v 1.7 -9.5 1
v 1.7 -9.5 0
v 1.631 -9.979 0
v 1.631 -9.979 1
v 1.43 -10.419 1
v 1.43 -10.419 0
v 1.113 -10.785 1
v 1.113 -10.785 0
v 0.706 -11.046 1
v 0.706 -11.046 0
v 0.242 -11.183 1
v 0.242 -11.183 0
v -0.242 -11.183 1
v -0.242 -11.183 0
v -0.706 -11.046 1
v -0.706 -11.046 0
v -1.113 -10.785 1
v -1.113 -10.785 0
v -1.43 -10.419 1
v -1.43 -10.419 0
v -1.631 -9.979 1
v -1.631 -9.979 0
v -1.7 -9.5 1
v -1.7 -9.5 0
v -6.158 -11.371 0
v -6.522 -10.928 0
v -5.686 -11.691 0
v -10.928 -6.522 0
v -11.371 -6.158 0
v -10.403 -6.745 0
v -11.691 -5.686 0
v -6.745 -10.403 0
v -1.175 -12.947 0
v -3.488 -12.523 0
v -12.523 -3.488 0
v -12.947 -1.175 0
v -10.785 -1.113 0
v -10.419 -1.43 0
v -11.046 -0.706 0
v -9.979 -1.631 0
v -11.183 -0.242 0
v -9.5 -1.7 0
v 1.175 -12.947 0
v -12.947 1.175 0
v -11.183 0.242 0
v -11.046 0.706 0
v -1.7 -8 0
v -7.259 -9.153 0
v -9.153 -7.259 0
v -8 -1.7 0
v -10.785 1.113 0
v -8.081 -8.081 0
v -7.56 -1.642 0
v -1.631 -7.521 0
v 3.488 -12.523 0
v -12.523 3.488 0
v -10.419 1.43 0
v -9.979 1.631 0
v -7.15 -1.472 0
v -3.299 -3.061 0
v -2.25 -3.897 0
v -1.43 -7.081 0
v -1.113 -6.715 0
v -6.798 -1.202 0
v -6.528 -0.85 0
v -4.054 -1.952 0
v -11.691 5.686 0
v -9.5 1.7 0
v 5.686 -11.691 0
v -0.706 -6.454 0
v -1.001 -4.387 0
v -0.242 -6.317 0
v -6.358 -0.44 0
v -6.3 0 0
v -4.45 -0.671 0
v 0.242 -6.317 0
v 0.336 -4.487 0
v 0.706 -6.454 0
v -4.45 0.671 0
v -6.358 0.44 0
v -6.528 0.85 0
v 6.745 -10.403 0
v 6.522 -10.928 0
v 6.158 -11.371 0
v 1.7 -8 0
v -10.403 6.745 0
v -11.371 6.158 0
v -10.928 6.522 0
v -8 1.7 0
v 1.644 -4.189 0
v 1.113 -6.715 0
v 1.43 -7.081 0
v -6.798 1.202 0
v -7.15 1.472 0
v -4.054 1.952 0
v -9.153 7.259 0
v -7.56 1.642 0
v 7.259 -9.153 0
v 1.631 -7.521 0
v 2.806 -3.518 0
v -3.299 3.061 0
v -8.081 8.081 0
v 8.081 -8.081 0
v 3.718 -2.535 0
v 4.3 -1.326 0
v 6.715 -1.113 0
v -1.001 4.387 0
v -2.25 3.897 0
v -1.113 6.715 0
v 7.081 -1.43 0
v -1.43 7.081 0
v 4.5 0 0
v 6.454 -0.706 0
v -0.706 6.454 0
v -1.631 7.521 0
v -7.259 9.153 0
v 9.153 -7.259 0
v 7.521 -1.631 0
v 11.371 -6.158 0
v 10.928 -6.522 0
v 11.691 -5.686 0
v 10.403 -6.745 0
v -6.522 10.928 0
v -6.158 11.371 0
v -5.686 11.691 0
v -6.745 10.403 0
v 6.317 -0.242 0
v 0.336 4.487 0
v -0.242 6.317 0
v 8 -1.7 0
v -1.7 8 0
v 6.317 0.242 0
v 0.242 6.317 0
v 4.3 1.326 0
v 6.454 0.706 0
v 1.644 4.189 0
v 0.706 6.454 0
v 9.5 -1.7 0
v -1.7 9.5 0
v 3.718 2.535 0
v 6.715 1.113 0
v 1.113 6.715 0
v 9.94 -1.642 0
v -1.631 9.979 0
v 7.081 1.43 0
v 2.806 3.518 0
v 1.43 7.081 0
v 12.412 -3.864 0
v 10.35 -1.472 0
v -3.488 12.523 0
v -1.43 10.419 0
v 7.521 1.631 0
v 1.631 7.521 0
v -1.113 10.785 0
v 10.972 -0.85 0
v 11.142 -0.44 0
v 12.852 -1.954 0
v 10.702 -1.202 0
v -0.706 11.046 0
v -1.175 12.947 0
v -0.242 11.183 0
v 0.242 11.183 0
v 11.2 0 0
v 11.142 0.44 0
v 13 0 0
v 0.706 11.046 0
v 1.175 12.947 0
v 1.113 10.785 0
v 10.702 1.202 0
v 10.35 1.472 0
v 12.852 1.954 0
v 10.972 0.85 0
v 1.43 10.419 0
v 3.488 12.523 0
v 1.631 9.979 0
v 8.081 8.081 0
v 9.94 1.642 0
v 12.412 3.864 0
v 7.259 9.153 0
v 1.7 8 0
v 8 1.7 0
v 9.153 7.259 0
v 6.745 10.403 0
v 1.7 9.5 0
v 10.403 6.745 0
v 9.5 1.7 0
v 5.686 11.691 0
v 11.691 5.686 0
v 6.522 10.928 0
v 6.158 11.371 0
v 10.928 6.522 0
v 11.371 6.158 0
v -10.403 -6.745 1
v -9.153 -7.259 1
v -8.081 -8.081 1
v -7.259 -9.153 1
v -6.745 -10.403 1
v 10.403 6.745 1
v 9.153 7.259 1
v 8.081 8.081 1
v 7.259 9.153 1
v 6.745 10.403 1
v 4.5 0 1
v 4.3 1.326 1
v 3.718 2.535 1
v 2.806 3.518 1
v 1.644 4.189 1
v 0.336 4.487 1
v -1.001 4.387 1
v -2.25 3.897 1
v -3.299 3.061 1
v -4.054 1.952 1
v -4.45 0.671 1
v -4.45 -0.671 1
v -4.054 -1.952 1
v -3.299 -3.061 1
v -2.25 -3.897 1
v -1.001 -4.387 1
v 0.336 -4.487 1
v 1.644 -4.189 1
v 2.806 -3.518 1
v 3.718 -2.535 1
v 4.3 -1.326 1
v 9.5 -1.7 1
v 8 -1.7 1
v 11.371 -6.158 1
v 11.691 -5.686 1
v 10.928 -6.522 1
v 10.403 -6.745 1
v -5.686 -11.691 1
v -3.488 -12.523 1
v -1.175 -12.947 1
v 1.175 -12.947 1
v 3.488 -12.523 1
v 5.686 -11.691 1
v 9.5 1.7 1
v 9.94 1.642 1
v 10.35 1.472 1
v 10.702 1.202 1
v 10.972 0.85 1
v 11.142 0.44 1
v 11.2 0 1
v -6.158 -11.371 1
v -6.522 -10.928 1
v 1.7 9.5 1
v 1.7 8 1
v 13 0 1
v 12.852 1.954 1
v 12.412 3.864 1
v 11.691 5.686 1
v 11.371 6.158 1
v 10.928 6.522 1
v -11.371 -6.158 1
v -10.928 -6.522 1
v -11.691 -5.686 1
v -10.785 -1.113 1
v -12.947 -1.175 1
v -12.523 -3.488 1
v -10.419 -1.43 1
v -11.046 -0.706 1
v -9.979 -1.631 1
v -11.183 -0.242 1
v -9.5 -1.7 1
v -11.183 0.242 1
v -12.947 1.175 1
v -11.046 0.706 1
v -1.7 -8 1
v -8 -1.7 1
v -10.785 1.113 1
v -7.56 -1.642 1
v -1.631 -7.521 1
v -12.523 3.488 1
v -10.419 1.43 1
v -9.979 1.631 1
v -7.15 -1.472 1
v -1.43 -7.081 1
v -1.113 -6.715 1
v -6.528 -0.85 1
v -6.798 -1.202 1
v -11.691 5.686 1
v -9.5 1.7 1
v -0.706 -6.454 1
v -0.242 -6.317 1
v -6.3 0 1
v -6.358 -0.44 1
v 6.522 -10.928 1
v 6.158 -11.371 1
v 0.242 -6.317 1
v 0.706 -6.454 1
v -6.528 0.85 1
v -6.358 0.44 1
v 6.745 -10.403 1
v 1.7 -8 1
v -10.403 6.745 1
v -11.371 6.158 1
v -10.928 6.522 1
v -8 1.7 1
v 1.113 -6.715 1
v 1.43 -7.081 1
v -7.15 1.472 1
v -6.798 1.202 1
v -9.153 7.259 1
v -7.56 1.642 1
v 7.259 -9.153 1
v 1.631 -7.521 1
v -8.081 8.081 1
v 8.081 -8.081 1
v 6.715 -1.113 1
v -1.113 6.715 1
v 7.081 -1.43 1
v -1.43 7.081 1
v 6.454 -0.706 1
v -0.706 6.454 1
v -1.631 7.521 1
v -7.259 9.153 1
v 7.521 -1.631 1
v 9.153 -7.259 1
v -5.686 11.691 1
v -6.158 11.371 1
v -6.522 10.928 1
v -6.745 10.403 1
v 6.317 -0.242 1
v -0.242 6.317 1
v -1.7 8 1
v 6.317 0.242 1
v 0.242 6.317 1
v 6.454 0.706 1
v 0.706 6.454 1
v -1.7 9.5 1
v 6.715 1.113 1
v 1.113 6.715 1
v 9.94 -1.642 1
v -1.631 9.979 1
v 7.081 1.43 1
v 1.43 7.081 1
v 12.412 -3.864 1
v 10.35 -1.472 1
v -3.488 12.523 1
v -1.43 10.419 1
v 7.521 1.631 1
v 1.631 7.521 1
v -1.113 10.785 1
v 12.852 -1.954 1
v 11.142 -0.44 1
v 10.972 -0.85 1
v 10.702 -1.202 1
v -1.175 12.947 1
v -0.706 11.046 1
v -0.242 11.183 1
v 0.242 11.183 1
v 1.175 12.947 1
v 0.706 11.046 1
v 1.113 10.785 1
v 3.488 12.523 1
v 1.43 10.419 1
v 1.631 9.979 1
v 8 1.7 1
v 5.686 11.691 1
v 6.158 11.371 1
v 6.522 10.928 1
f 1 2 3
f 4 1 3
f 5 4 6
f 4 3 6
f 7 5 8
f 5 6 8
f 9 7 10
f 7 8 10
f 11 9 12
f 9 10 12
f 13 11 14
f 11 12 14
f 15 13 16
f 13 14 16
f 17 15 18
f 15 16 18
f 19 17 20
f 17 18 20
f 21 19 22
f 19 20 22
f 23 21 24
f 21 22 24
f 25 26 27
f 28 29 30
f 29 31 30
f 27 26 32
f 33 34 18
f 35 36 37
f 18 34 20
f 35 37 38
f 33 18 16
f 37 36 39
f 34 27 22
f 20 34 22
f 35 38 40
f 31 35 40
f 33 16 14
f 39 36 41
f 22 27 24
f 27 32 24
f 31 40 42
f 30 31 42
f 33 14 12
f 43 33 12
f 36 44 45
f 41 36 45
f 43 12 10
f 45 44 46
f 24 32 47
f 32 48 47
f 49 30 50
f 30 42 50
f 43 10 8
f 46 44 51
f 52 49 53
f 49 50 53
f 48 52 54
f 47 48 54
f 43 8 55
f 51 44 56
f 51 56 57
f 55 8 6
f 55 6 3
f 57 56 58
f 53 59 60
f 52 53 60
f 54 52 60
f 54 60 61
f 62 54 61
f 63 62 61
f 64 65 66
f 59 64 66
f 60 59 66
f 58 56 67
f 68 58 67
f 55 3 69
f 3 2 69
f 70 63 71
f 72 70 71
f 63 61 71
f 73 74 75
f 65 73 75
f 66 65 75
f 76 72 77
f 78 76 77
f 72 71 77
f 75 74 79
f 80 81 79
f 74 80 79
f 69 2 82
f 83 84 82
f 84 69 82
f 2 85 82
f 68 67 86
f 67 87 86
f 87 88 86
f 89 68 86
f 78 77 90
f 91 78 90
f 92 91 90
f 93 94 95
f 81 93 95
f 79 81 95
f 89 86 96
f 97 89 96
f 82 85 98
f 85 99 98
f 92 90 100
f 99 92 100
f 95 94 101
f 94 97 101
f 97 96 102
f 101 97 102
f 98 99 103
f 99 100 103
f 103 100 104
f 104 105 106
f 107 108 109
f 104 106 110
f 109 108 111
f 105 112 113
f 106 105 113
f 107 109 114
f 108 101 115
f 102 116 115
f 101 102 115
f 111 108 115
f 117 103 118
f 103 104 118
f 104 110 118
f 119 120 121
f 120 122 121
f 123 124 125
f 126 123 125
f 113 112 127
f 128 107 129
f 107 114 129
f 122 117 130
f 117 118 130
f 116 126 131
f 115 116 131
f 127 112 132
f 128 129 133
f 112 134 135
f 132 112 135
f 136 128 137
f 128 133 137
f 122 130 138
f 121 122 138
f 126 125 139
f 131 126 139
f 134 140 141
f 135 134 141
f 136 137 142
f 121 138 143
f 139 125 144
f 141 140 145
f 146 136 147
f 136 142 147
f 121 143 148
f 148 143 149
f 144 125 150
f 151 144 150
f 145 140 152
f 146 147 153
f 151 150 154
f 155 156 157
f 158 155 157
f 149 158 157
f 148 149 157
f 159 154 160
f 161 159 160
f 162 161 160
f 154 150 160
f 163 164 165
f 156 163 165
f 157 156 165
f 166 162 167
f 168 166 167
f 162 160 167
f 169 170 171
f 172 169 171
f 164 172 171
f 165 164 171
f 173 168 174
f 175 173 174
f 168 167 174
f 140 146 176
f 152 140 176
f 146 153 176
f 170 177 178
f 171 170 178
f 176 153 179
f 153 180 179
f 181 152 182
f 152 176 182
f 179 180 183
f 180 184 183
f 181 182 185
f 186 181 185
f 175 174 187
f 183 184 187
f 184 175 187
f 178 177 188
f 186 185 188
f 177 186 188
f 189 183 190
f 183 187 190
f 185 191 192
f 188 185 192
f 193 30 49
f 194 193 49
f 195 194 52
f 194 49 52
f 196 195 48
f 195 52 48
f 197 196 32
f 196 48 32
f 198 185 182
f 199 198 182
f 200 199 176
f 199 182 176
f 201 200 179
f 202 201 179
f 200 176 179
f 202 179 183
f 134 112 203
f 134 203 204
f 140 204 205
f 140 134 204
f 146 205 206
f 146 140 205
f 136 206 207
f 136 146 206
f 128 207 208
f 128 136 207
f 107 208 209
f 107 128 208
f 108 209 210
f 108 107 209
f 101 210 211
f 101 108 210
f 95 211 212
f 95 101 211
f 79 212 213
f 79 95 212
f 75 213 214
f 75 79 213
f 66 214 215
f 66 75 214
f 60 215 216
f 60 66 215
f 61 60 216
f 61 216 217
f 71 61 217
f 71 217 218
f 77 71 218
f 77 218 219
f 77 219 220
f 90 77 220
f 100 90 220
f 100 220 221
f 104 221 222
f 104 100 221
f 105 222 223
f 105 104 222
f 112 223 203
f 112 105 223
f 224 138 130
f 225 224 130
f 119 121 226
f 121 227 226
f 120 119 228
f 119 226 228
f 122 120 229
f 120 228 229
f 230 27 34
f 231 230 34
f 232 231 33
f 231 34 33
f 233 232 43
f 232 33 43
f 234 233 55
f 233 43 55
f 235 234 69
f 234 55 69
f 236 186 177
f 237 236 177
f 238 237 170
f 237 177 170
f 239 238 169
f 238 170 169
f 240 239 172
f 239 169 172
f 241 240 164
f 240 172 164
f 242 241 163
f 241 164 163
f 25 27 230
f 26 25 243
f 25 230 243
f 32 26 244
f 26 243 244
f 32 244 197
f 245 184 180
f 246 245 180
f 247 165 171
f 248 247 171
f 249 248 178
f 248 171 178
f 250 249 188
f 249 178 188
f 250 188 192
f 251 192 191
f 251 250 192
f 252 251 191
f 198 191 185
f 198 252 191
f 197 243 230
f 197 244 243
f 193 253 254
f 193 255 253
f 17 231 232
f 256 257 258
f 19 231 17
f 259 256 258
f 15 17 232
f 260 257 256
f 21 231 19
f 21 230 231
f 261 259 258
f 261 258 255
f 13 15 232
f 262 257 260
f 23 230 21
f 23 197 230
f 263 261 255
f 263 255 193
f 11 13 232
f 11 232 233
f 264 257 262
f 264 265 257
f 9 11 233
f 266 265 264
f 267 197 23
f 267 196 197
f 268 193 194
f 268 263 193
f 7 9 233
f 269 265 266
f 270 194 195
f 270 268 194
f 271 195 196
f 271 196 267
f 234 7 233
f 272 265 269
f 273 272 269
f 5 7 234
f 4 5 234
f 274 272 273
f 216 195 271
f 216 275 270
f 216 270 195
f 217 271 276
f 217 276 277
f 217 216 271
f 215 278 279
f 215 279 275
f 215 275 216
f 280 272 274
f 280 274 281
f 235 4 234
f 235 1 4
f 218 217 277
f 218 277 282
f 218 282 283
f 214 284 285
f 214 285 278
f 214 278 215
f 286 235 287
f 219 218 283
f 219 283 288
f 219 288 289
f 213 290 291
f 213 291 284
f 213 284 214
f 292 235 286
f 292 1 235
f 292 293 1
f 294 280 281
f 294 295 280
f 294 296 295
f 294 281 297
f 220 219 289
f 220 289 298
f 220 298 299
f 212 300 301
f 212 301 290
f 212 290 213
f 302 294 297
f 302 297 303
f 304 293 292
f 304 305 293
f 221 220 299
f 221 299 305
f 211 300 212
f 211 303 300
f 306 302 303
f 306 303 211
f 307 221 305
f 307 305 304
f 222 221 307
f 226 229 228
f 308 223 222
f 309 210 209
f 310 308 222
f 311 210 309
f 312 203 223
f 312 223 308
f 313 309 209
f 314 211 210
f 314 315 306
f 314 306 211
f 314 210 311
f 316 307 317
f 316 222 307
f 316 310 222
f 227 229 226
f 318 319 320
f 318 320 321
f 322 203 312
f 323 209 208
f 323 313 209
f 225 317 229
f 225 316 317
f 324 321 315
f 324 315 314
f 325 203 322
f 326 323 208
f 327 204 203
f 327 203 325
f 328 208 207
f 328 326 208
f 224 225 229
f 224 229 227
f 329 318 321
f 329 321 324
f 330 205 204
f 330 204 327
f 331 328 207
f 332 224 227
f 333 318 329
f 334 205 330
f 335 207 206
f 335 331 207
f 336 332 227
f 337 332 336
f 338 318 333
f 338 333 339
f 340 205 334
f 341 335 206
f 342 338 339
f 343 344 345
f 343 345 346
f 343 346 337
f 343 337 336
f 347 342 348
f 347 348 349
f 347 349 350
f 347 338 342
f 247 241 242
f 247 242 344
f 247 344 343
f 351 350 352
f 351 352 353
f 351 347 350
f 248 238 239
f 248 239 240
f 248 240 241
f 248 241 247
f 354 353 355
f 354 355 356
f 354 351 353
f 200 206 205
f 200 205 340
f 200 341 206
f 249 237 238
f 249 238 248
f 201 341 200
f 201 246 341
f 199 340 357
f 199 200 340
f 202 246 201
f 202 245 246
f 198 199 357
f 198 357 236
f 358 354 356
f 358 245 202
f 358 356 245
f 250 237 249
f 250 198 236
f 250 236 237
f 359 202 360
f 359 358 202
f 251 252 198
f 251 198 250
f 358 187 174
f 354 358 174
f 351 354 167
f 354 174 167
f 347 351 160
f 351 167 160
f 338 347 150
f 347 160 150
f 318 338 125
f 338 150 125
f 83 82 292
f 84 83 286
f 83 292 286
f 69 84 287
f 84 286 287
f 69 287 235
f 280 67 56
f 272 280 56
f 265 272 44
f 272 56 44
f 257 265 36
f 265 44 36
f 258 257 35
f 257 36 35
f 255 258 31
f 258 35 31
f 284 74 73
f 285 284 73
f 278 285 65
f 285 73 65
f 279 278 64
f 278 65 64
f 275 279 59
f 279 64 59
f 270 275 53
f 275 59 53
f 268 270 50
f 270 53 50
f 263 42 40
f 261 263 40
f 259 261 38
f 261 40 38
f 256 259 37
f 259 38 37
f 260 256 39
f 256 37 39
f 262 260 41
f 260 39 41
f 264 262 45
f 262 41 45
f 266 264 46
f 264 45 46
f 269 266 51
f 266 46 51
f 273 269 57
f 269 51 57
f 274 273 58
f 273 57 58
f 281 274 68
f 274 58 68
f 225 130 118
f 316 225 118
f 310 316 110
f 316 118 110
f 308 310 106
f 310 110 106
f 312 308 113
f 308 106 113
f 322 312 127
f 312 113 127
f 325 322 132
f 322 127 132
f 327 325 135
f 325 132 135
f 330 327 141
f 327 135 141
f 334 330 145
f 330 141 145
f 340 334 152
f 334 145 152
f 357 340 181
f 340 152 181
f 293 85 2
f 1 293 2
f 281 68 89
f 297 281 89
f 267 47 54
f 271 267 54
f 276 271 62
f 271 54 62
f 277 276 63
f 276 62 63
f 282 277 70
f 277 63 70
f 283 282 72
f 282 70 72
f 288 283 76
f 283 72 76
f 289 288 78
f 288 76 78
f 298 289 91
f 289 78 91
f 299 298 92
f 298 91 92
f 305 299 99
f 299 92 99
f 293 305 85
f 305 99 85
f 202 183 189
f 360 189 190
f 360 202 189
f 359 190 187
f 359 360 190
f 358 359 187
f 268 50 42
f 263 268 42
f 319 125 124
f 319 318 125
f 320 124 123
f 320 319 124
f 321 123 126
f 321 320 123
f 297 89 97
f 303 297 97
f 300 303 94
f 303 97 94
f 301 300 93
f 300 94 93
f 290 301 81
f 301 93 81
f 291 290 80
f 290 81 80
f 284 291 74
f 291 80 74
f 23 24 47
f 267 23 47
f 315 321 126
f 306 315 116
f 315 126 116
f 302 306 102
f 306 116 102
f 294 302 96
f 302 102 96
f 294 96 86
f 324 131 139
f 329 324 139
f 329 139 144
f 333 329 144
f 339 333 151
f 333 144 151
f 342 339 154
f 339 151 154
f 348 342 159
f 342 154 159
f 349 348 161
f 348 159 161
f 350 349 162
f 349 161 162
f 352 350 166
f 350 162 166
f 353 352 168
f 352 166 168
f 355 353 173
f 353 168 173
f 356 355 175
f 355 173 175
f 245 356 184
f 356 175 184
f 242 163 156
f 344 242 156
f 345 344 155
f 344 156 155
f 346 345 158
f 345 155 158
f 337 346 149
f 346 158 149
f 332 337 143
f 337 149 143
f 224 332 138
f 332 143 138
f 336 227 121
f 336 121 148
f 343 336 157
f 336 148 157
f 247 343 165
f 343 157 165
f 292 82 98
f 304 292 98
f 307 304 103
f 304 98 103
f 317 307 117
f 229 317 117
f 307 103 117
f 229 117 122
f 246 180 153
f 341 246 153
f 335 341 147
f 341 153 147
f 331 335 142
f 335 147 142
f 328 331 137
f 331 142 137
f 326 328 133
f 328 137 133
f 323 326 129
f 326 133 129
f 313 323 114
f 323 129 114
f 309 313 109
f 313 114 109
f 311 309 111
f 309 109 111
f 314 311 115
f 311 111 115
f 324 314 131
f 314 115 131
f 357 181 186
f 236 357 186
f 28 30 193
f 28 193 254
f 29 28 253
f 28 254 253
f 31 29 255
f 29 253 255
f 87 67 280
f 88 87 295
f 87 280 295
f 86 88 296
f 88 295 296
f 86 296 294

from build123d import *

# Parameters (mm, degrees)
F2_R     = 4.5
F3_DEPTH = 1
F4_R     = 2


with BuildPart() as f3:
    # F2 (on Top) → F3 (new body)
    with BuildSketch(Plane.XY):
        with BuildLine():
            ThreePointArc((11.2, -6.6), (12.5419296761, -3.4205262753), (13, 0))
            ThreePointArc((13, 0), (12.5419296761, 3.4205262753), (11.2, 6.6))
            ThreePointArc((11.2, 6.6), (8.0806476452, 8.0806476452), (6.6, 11.2))
            ThreePointArc((6.6, 11.2), (0, 13), (-6.6, 11.2))
            ThreePointArc((-6.6, 11.2), (-8.0806476452, 8.0806476452), (-11.2, 6.6))
            ThreePointArc((-11.2, 6.6), (-13, 0), (-11.2, -6.6))
            ThreePointArc((-11.2, -6.6), (-8.0806476452, -8.0806476452), (-6.6, -11.2))
            ThreePointArc((-6.6, -11.2), (0, -13), (6.6, -11.2))
            ThreePointArc((6.6, -11.2), (8.0806476452, -8.0806476452), (11.2, -6.6))
        make_face()
        with BuildLine():
            ThreePointArc((-1.7, -8), (0, -6.3), (1.7, -8))
            Line((1.7, -8), (1.7, -9.5))
            ThreePointArc((1.7, -9.5), (0, -11.2), (-1.7, -9.5))
            Line((-1.7, -9.5), (-1.7, -8))
        make_face(mode=Mode.SUBTRACT)
        with BuildLine():
            ThreePointArc((-9.5, -1.7), (-11.2, 0), (-9.5, 1.7))
            Line((-9.5, 1.7), (-8, 1.7))
            ThreePointArc((-8, 1.7), (-6.797918472, 1.202081528), (-6.3, 0))
            ThreePointArc((-6.3, 0), (-6.797918472, -1.202081528), (-8, -1.7))
            Line((-8, -1.7), (-9.5, -1.7))
        make_face(mode=Mode.SUBTRACT)
        Circle(F2_R, mode=Mode.SUBTRACT)
        with BuildLine():
            ThreePointArc((8, -1.7), (6.3, 0), (8, 1.7))
            Line((8, 1.7), (9.5, 1.7))
            ThreePointArc((9.5, 1.7), (10.702081528, 1.202081528), (11.2, 0))
            ThreePointArc((11.2, 0), (10.702081528, -1.202081528), (9.5, -1.7))
            Line((9.5, -1.7), (8, -1.7))
        make_face(mode=Mode.SUBTRACT)
        with BuildLine():
            ThreePointArc((-1.7, 9.5), (0, 11.2), (1.7, 9.5))
            Line((1.7, 9.5), (1.7, 8))
            ThreePointArc((1.7, 8), (0, 6.3), (-1.7, 8))
            Line((-1.7, 8), (-1.7, 9.5))
        make_face(mode=Mode.SUBTRACT)
    extrude(amount=F3_DEPTH)

    # F4
    f4_edges = [f3.edges().sort_by_distance(p)[0] for p in [
        (-11.2, -6.6, 0.5),
        (11.2, -6.6, 0.5),
        (11.2, 6.6, 0.5),
        (-11.2, 6.6, 0.5),
        (6.6, -11.2, 0.5),
        (-6.6, -11.2, 0.5),
        (-6.6, 11.2, 0.5),
        (6.6, 11.2, 0.5),
    ]]
    fillet(f4_edges, radius=F4_R)


solid = f3.part
